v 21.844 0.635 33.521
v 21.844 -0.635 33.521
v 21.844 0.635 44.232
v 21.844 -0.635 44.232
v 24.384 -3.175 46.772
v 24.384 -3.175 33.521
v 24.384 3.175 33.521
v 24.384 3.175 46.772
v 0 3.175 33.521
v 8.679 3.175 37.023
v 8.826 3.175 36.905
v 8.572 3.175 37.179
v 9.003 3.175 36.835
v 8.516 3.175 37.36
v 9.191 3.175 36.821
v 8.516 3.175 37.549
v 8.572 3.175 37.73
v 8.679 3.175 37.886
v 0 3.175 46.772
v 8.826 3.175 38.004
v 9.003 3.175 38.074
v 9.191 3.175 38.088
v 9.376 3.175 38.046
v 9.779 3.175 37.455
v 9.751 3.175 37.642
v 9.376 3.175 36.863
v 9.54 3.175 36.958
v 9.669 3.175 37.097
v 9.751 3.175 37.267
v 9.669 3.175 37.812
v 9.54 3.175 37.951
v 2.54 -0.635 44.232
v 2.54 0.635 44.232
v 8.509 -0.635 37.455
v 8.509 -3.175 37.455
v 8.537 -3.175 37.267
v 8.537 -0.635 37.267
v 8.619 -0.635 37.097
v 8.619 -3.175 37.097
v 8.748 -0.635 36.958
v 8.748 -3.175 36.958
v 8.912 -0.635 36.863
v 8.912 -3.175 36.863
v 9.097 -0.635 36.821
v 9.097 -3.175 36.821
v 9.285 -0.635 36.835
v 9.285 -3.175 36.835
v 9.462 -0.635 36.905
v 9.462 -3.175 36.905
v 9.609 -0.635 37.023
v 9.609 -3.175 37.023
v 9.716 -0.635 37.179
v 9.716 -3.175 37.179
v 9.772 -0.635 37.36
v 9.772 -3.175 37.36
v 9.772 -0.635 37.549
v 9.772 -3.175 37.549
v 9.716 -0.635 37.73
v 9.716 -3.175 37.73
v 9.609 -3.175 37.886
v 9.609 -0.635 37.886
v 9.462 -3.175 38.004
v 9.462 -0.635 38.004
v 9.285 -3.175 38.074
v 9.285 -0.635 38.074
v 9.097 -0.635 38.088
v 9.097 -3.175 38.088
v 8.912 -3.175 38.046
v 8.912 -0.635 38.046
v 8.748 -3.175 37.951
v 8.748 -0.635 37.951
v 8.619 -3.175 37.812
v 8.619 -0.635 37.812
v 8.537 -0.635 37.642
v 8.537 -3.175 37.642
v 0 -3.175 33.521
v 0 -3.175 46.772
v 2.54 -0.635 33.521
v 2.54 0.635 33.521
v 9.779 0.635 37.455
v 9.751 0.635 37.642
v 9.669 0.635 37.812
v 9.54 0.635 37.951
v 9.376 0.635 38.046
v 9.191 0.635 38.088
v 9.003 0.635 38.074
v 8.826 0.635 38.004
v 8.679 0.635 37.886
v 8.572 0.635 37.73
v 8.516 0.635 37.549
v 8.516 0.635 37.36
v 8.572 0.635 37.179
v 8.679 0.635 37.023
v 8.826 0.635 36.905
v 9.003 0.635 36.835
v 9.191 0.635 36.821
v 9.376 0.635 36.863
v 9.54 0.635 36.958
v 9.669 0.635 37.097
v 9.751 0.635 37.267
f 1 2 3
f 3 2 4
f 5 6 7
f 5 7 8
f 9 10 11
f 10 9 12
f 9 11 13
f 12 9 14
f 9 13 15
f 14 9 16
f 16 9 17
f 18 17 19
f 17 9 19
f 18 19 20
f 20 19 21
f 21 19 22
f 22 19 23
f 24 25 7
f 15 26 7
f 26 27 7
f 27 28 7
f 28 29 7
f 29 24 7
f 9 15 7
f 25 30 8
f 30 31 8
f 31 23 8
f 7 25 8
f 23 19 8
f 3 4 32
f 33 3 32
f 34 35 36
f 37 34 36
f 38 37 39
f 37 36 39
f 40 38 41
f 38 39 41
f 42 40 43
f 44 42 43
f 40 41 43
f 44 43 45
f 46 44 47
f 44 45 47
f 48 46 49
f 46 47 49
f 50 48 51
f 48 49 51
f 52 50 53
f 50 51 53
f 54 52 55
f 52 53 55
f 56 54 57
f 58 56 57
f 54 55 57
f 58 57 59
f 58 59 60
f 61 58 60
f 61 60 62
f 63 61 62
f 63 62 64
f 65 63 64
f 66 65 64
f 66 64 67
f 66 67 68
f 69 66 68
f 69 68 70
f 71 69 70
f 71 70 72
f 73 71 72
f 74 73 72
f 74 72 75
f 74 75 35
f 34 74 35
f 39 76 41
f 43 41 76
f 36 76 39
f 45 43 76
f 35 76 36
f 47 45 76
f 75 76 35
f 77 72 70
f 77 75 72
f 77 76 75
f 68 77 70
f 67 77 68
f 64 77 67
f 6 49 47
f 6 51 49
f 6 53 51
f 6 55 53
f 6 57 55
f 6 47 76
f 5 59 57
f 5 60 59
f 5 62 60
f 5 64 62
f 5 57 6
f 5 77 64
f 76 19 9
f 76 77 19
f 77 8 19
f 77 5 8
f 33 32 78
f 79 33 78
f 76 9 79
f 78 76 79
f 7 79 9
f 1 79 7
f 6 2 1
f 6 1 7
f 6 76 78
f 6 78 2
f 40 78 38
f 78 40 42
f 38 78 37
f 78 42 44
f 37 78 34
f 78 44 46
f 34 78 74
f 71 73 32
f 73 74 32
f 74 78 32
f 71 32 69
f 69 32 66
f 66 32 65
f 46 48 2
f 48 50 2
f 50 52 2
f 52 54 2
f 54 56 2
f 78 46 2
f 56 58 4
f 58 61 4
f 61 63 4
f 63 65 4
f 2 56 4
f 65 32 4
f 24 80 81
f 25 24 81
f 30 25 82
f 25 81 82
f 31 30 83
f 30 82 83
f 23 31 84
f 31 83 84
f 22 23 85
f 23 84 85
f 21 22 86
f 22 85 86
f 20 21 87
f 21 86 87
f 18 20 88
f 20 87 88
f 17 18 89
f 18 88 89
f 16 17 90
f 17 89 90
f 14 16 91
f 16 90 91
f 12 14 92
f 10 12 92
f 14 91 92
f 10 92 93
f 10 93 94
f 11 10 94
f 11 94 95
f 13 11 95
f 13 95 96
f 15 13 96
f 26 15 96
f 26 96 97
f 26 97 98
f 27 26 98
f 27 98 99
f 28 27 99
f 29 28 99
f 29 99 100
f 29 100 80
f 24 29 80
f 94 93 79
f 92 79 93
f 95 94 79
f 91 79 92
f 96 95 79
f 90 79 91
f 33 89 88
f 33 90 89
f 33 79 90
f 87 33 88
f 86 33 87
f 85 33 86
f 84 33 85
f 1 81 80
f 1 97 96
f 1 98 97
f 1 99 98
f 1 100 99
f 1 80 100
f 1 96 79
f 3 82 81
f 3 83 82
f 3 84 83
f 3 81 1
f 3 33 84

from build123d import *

# Parameters (mm, degrees)
F1_DEPTH = 3.175
F2_T     = -2.54
F3_D     = 1.27
F3_DEPTH = 3.176
F4_D     = 1.27


with BuildPart() as f1:
    # F0 (on Front) → F1 (new body, symmetric)
    with BuildSketch(Plane.XZ):
        Polygon((0, 46.7720143497), (0, 33.5211828351), (6.096, 33.5211828351), (9.144, 33.5211828351), (12.192, 33.5211828351), (24.384, 33.5211828351), (24.384, 46.7720143497), align=None)
    extrude(amount=F1_DEPTH, both=True)

    # F2
    f2_openings = [f1.faces().sort_by_distance(p)[0] for p in [
        (12.192, 0, 33.521183),
    ]]
    offset(amount=F2_T, openings=f2_openings)

    # F3 (through all, one way)
    with BuildSketch(Plane.XZ):
        with Locations((9.144, 37.4545268714)):
            Circle(F3_D / 2)
    extrude(amount=-F3_DEPTH, mode=Mode.SUBTRACT)

    # F4 (through all)
    with Locations(Plane(origin=(0, 0, 0), x_dir=(1, 0, 0), z_dir=(0, 1, 0))):
        with Locations((9.144, -37.4545268714)):
            Hole(F4_D / 2)


solid = f1.part
